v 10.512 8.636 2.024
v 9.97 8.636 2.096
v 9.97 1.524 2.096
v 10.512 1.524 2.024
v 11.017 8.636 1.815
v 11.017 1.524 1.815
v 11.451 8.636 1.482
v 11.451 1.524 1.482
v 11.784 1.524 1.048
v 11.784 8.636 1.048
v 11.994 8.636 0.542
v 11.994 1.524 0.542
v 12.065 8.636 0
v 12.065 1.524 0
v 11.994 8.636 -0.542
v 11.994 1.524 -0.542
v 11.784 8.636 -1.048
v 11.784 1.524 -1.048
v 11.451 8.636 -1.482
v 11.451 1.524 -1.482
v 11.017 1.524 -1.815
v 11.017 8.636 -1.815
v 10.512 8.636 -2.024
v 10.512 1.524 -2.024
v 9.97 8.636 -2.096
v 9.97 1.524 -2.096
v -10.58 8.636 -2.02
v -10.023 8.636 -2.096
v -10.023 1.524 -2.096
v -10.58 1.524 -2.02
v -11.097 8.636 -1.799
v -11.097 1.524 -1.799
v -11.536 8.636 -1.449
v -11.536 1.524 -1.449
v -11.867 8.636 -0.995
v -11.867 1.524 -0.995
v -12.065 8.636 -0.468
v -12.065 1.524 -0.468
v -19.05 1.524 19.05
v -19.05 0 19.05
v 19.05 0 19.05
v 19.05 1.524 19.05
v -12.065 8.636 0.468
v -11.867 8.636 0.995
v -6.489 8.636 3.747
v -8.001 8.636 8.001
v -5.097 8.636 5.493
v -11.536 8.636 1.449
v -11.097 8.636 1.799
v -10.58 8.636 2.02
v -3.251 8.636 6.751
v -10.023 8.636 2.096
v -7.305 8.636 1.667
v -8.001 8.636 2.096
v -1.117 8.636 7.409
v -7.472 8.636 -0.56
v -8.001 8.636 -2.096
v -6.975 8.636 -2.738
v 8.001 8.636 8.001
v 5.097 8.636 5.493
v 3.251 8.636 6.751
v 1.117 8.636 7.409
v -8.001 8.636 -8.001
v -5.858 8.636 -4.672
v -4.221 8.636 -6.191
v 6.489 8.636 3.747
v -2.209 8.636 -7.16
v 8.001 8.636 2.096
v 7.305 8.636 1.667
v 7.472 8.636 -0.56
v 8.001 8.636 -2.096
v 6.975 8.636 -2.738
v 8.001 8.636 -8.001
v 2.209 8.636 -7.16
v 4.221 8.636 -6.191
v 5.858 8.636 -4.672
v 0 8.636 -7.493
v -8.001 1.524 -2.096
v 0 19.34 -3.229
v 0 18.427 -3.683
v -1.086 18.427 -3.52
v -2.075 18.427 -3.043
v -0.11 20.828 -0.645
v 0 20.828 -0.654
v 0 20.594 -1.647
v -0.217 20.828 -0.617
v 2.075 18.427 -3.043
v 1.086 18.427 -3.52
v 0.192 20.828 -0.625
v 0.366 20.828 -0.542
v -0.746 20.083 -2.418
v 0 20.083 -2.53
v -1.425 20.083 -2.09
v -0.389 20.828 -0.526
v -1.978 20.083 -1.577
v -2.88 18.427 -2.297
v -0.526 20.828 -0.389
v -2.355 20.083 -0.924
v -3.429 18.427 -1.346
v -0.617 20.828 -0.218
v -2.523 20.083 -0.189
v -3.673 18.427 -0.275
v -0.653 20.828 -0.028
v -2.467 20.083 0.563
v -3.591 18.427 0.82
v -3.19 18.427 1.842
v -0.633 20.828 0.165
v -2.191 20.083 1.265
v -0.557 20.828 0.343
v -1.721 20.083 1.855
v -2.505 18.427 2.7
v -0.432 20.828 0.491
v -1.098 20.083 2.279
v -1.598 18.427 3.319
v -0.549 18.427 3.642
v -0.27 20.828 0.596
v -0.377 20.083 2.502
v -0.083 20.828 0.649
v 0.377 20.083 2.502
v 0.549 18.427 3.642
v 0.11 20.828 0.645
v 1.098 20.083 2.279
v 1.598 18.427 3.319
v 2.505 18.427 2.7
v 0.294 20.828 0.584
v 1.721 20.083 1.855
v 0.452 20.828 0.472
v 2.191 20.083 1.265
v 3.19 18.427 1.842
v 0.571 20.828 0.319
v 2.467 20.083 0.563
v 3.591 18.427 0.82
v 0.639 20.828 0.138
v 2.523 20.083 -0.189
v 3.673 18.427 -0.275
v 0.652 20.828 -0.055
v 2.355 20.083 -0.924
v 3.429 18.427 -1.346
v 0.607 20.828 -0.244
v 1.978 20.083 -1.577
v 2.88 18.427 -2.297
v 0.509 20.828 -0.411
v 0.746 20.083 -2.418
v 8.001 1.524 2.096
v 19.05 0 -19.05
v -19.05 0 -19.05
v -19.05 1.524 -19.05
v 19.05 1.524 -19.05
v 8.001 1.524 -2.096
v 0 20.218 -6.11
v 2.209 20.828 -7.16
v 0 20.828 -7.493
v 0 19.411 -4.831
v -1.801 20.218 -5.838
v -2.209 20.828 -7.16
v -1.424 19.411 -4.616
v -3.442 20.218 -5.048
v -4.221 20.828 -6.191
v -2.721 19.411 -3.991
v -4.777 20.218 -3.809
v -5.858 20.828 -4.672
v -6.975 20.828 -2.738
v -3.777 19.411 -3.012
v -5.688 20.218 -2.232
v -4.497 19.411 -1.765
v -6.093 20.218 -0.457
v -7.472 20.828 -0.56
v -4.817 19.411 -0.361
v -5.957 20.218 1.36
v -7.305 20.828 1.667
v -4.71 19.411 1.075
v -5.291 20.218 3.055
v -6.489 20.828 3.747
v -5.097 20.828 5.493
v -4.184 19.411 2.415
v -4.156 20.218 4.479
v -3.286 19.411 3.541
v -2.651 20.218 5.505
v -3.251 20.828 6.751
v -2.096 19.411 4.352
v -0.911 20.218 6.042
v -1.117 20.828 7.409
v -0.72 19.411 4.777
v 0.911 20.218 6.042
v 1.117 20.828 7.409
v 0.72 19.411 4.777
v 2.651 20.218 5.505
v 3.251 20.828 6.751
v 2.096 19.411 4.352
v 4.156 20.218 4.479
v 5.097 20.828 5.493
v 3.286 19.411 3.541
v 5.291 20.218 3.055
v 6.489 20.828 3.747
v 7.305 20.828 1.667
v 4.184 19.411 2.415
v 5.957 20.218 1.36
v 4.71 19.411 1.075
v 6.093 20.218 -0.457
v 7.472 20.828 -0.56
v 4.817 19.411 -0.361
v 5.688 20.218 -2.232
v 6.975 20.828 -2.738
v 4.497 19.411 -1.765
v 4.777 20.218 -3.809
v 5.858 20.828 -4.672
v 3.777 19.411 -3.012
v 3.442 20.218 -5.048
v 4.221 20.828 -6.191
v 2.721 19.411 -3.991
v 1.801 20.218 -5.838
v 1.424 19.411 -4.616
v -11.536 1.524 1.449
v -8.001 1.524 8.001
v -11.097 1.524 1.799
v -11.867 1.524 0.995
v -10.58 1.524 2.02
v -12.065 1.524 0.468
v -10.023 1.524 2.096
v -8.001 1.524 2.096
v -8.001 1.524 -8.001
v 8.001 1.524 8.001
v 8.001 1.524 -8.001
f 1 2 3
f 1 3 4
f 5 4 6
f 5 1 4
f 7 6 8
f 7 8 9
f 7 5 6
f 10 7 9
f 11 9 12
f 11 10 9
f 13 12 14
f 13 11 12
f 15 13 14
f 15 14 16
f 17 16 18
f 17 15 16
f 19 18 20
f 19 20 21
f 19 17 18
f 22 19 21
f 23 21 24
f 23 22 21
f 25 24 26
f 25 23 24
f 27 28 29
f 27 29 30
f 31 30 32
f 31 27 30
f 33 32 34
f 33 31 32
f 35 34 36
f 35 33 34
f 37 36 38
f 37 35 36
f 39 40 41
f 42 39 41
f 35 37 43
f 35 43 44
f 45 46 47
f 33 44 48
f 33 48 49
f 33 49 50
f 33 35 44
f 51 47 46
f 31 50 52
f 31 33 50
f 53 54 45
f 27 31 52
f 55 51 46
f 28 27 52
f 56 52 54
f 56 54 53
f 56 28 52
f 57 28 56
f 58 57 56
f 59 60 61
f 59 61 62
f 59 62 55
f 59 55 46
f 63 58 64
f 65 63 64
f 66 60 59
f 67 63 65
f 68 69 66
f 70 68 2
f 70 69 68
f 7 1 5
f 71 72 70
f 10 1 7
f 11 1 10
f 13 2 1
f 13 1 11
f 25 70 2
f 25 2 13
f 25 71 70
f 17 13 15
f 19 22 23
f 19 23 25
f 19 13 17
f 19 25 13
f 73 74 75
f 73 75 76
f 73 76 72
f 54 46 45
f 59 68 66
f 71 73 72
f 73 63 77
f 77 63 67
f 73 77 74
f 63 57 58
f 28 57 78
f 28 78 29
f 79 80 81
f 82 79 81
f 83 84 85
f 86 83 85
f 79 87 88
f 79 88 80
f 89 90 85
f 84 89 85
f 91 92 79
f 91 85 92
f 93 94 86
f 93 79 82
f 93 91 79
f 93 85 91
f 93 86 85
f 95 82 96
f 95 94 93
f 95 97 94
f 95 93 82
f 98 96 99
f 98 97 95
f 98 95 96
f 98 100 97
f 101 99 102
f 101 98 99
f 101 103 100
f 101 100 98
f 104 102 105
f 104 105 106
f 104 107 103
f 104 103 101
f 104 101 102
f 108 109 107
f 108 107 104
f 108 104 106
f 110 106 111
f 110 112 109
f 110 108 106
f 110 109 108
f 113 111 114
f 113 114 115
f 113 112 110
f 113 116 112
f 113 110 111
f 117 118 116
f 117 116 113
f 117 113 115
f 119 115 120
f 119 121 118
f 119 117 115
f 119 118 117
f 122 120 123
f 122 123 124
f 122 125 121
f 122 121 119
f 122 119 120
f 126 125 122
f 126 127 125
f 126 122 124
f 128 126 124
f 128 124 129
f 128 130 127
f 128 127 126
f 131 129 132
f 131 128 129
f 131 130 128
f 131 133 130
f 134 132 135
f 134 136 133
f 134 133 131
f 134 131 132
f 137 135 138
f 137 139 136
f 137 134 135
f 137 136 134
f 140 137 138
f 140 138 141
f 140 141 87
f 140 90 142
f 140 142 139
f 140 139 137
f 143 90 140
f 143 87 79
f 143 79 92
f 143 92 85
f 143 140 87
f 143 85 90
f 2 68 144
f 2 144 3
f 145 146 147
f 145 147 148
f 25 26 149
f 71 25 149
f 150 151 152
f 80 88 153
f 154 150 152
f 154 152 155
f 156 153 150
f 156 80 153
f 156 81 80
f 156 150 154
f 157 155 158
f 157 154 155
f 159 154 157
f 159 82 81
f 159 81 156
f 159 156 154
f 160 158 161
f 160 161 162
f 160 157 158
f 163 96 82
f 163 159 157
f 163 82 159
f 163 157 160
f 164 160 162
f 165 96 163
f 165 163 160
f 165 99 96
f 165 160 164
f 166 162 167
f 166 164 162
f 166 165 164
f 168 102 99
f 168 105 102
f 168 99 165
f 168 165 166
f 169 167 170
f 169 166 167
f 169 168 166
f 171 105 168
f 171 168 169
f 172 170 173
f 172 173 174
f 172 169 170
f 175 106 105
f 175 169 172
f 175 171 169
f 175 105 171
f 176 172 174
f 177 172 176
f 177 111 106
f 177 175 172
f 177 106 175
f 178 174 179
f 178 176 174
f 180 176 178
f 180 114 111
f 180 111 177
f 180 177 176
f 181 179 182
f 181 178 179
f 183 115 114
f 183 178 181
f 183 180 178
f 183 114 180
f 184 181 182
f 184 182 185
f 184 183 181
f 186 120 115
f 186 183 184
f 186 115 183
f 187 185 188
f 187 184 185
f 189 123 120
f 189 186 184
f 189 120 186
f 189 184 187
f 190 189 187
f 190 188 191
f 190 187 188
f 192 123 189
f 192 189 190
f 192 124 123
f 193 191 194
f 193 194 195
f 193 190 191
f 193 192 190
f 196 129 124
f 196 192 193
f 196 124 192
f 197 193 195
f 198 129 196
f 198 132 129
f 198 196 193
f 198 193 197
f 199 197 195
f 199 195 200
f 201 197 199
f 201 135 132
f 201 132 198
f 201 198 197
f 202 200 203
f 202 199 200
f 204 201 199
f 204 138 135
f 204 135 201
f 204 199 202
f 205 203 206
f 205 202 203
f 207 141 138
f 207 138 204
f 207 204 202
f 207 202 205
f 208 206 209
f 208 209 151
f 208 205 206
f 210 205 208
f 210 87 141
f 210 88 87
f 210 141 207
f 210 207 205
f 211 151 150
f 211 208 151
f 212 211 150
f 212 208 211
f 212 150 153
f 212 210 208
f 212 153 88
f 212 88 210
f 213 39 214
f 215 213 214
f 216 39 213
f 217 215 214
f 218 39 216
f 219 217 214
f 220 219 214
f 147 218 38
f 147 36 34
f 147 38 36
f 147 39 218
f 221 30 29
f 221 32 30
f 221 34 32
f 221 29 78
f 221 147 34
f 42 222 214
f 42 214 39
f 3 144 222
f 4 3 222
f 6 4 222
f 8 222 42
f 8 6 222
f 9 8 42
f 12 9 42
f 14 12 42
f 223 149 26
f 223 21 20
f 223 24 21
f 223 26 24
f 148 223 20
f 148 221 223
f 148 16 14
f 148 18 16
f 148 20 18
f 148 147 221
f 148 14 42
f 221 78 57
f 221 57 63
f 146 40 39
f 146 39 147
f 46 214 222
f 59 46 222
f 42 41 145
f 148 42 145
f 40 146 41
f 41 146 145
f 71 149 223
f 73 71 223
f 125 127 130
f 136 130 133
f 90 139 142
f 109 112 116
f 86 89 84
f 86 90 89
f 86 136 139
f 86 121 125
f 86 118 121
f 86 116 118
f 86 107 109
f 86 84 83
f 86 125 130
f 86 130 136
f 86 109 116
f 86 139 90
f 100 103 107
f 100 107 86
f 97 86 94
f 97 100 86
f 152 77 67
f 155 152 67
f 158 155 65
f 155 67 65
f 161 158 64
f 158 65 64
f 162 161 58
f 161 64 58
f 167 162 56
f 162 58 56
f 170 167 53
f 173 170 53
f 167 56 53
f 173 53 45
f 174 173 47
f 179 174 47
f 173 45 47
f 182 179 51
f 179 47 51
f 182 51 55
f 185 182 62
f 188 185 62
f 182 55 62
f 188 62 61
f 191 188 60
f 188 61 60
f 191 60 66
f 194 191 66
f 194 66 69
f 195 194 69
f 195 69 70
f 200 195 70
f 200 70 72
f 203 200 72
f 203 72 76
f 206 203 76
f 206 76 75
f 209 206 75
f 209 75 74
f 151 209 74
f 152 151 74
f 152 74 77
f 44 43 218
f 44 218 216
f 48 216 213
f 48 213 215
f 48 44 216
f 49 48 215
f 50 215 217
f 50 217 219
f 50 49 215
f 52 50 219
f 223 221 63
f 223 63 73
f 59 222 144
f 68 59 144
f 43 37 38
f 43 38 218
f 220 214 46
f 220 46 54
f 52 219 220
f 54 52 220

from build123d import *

# Parameters (mm, degrees)
SKETCH3_W           = 38.1
SKETCH3_H           = 38.1
BOSS_EXTRUDE2_DEPTH = 1.524
SKETCH4_W           = 16.002
SKETCH4_H           = 16.002
BOSS_EXTRUDE3_DEPTH = 7.112
SKETCH5_R           = 7.493
BOSS_EXTRUDE4_DEPTH = 12.192
BOSS_EXTRUDE6_DEPTH = 7.112


with BuildPart() as part:
    # Sketch3 → Boss-Extrude2 (new body)
    with BuildSketch(Plane(origin=(0, 0, 0), x_dir=(1, 0, 0), z_dir=(0, 1, 0))):
        Rectangle(SKETCH3_W, SKETCH3_H)
    extrude(amount=BOSS_EXTRUDE2_DEPTH)

    # Sketch4 → Boss-Extrude3 (add)
    with BuildSketch(Plane(origin=(0, 1.524, 0), x_dir=(1, 0, 0), z_dir=(0, 1, 0))):
        Rectangle(SKETCH4_W, SKETCH4_H)
    extrude(amount=BOSS_EXTRUDE3_DEPTH)

    # Sketch5 → Boss-Extrude4 (add)
    with BuildSketch(Plane(origin=(0, 8.636, 0), x_dir=(1, 0, 0), z_dir=(0, 1, 0))):
        with Locations(Location((0, 0, 0), (0, 0, 90))):
            Circle(SKETCH5_R)
    extrude(amount=BOSS_EXTRUDE4_DEPTH)

    # Sketch6 → Boss-Extrude6 (add)
    with BuildSketch(Plane(origin=(0, 8.636, 0), x_dir=(1, 0, 0), z_dir=(0, 1, 0))):
        with BuildLine():
            ThreePointArc((8.001, -0.71842049), (8.768319307, -1.717057132), (9.9695, -2.0955))
            ThreePointArc((9.9695, -2.0955), (11.45124226, -1.48174226), (12.065, 0))
            ThreePointArc((12.065, 0), (11.45124226, 1.48174226), (9.9695, 2.0955))
            ThreePointArc((9.9695, 2.0955), (8.768319307, 1.717057132), (8.001, 0.71842049))
            Line((8.001, 0.71842049), (8.001, -0.71842049))
        make_face()
        with BuildLine():
            ThreePointArc((8.001, 0.71842049), (7.874, 0), (8.001, -0.71842049))
            Line((8.001, -0.71842049), (8.001, 0.71842049))
        make_face()
        with BuildLine():
            Line((8.001, -2.0955), (9.9695, -2.0955))
            ThreePointArc((9.9695, -2.0955), (8.768319307, -1.717057132), (8.001, -0.71842049))
            Line((8.001, -0.71842049), (8.001, -2.0955))
        make_face()
        with BuildLine():
            Line((7.194020347, -2.0955), (8.001, -2.0955))
            Line((8.001, -2.0955), (8.001, -0.71842049))
            ThreePointArc((8.001, -0.71842049), (7.874, 0), (8.001, 0.71842049))
            Line((8.001, 0.71842049), (8.001, 2.0955))
            Line((8.001, 2.0955), (7.194020347, 2.0955))
            ThreePointArc((7.194020347, 2.0955), (7.417878519, 1.058360652), (7.493, 0))
            ThreePointArc((7.493, 0), (7.417878519, -1.058360652), (7.194020347, -2.0955))
        make_face()
        with BuildLine():
            ThreePointArc((8.001, 0.71842049), (8.768319307, 1.717057132), (9.9695, 2.0955))
            Line((9.9695, 2.0955), (8.001, 2.0955))
            Line((8.001, 2.0955), (8.001, 0.71842049))
        make_face()
        with BuildLine():
            Line((-7.194020347, -2.0955), (7.194020347, -2.0955))
            ThreePointArc((7.194020347, -2.0955), (7.417878519, -1.058360652), (7.493, 0))
            ThreePointArc((7.493, 0), (7.417878519, 1.058360652), (7.194020347, 2.0955))
            Line((7.194020347, 2.0955), (-7.194020347, 2.0955))
            ThreePointArc((-7.194020347, 2.0955), (-7.493, 0), (-7.194020347, -2.0955))
        make_face()
        with BuildLine():
            Line((-8.001, -2.0955), (-7.194020347, -2.0955))
            ThreePointArc((-7.194020347, -2.0955), (-7.493, 0), (-7.194020347, 2.0955))
            Line((-7.194020347, 2.0955), (-8.001, 2.0955))
            Line((-8.001, 2.0955), (-8.001, 0.55189456))
            ThreePointArc((-8.001, 0.55189456), (-7.945595412, 0.27841562), (-7.927017411, 0))
            ThreePointArc((-7.927017411, 0), (-7.945595412, -0.27841562), (-8.001, -0.55189456))
            Line((-8.001, -0.55189456), (-8.001, -2.0955))
        make_face()
        with BuildLine():
            ThreePointArc((-12.065, -0.468385659), (-11.328200782, -1.638997006), (-10.022517424, -2.0955))
            ThreePointArc((-10.022517424, -2.0955), (-8.750781359, -1.665475206), (-8.001, -0.55189456))
            Line((-8.001, -0.55189456), (-8.001, 0.55189456))
            ThreePointArc((-8.001, 0.55189456), (-8.75078136, 1.665475207), (-10.022517427, 2.0955))
            ThreePointArc((-10.022517427, 2.0955), (-11.328200783, 1.638997005), (-12.065, 0.468385659))
            Line((-12.065, 0.468385659), (-12.065, -0.468385659))
        make_face()
        with BuildLine():
            Line((-10.022517424, -2.0955), (-8.001, -2.0955))
            Line((-8.001, -2.0955), (-8.001, -0.55189456))
            ThreePointArc((-8.001, -0.55189456), (-8.750781359, -1.665475206), (-10.022517424, -2.0955))
        make_face()
        with BuildLine():
            Line((-8.001, 0.55189456), (-8.001, -0.55189456))
            ThreePointArc((-8.001, -0.55189456), (-7.945595412, -0.27841562), (-7.927017411, 0))
            ThreePointArc((-7.927017411, 0), (-7.945595412, 0.27841562), (-8.001, 0.55189456))
        make_face()
        with BuildLine():
            Line((-8.001, 0.55189456), (-8.001, 2.0955))
            Line((-8.001, 2.0955), (-10.022517427, 2.0955))
            ThreePointArc((-10.022517427, 2.0955), (-8.75078136, 1.665475207), (-8.001, 0.55189456))
        make_face()
    extrude(amount=-BOSS_EXTRUDE6_DEPTH)

    # Sketch8 → Cut-Revolve2 (revolve, cut)
    with BuildSketch(Plane.XY, mode=Mode.PRIVATE) as cut_revolve2_sk:
        with BuildLine():
            ThreePointArc((-3.683327211, 18.4271959), (-2.28773348, 20.259113148), (-0.056148749, 20.828))
            ThreePointArc((-0.056148749, 20.828), (-3.774574374, 21.391967579), (-7.493, 20.828))
            ThreePointArc((-7.493, 20.828), (-5.455602523, 19.837950118), (-3.683327211, 18.4271959))
        make_face()
    revolve(cut_revolve2_sk.sketch.rotate(Axis((0, 0, 0), (0, 1, 0)), 270), axis=Axis((0, 0, 0), (0, 1, 0)), mode=Mode.SUBTRACT)


solid = part.part
